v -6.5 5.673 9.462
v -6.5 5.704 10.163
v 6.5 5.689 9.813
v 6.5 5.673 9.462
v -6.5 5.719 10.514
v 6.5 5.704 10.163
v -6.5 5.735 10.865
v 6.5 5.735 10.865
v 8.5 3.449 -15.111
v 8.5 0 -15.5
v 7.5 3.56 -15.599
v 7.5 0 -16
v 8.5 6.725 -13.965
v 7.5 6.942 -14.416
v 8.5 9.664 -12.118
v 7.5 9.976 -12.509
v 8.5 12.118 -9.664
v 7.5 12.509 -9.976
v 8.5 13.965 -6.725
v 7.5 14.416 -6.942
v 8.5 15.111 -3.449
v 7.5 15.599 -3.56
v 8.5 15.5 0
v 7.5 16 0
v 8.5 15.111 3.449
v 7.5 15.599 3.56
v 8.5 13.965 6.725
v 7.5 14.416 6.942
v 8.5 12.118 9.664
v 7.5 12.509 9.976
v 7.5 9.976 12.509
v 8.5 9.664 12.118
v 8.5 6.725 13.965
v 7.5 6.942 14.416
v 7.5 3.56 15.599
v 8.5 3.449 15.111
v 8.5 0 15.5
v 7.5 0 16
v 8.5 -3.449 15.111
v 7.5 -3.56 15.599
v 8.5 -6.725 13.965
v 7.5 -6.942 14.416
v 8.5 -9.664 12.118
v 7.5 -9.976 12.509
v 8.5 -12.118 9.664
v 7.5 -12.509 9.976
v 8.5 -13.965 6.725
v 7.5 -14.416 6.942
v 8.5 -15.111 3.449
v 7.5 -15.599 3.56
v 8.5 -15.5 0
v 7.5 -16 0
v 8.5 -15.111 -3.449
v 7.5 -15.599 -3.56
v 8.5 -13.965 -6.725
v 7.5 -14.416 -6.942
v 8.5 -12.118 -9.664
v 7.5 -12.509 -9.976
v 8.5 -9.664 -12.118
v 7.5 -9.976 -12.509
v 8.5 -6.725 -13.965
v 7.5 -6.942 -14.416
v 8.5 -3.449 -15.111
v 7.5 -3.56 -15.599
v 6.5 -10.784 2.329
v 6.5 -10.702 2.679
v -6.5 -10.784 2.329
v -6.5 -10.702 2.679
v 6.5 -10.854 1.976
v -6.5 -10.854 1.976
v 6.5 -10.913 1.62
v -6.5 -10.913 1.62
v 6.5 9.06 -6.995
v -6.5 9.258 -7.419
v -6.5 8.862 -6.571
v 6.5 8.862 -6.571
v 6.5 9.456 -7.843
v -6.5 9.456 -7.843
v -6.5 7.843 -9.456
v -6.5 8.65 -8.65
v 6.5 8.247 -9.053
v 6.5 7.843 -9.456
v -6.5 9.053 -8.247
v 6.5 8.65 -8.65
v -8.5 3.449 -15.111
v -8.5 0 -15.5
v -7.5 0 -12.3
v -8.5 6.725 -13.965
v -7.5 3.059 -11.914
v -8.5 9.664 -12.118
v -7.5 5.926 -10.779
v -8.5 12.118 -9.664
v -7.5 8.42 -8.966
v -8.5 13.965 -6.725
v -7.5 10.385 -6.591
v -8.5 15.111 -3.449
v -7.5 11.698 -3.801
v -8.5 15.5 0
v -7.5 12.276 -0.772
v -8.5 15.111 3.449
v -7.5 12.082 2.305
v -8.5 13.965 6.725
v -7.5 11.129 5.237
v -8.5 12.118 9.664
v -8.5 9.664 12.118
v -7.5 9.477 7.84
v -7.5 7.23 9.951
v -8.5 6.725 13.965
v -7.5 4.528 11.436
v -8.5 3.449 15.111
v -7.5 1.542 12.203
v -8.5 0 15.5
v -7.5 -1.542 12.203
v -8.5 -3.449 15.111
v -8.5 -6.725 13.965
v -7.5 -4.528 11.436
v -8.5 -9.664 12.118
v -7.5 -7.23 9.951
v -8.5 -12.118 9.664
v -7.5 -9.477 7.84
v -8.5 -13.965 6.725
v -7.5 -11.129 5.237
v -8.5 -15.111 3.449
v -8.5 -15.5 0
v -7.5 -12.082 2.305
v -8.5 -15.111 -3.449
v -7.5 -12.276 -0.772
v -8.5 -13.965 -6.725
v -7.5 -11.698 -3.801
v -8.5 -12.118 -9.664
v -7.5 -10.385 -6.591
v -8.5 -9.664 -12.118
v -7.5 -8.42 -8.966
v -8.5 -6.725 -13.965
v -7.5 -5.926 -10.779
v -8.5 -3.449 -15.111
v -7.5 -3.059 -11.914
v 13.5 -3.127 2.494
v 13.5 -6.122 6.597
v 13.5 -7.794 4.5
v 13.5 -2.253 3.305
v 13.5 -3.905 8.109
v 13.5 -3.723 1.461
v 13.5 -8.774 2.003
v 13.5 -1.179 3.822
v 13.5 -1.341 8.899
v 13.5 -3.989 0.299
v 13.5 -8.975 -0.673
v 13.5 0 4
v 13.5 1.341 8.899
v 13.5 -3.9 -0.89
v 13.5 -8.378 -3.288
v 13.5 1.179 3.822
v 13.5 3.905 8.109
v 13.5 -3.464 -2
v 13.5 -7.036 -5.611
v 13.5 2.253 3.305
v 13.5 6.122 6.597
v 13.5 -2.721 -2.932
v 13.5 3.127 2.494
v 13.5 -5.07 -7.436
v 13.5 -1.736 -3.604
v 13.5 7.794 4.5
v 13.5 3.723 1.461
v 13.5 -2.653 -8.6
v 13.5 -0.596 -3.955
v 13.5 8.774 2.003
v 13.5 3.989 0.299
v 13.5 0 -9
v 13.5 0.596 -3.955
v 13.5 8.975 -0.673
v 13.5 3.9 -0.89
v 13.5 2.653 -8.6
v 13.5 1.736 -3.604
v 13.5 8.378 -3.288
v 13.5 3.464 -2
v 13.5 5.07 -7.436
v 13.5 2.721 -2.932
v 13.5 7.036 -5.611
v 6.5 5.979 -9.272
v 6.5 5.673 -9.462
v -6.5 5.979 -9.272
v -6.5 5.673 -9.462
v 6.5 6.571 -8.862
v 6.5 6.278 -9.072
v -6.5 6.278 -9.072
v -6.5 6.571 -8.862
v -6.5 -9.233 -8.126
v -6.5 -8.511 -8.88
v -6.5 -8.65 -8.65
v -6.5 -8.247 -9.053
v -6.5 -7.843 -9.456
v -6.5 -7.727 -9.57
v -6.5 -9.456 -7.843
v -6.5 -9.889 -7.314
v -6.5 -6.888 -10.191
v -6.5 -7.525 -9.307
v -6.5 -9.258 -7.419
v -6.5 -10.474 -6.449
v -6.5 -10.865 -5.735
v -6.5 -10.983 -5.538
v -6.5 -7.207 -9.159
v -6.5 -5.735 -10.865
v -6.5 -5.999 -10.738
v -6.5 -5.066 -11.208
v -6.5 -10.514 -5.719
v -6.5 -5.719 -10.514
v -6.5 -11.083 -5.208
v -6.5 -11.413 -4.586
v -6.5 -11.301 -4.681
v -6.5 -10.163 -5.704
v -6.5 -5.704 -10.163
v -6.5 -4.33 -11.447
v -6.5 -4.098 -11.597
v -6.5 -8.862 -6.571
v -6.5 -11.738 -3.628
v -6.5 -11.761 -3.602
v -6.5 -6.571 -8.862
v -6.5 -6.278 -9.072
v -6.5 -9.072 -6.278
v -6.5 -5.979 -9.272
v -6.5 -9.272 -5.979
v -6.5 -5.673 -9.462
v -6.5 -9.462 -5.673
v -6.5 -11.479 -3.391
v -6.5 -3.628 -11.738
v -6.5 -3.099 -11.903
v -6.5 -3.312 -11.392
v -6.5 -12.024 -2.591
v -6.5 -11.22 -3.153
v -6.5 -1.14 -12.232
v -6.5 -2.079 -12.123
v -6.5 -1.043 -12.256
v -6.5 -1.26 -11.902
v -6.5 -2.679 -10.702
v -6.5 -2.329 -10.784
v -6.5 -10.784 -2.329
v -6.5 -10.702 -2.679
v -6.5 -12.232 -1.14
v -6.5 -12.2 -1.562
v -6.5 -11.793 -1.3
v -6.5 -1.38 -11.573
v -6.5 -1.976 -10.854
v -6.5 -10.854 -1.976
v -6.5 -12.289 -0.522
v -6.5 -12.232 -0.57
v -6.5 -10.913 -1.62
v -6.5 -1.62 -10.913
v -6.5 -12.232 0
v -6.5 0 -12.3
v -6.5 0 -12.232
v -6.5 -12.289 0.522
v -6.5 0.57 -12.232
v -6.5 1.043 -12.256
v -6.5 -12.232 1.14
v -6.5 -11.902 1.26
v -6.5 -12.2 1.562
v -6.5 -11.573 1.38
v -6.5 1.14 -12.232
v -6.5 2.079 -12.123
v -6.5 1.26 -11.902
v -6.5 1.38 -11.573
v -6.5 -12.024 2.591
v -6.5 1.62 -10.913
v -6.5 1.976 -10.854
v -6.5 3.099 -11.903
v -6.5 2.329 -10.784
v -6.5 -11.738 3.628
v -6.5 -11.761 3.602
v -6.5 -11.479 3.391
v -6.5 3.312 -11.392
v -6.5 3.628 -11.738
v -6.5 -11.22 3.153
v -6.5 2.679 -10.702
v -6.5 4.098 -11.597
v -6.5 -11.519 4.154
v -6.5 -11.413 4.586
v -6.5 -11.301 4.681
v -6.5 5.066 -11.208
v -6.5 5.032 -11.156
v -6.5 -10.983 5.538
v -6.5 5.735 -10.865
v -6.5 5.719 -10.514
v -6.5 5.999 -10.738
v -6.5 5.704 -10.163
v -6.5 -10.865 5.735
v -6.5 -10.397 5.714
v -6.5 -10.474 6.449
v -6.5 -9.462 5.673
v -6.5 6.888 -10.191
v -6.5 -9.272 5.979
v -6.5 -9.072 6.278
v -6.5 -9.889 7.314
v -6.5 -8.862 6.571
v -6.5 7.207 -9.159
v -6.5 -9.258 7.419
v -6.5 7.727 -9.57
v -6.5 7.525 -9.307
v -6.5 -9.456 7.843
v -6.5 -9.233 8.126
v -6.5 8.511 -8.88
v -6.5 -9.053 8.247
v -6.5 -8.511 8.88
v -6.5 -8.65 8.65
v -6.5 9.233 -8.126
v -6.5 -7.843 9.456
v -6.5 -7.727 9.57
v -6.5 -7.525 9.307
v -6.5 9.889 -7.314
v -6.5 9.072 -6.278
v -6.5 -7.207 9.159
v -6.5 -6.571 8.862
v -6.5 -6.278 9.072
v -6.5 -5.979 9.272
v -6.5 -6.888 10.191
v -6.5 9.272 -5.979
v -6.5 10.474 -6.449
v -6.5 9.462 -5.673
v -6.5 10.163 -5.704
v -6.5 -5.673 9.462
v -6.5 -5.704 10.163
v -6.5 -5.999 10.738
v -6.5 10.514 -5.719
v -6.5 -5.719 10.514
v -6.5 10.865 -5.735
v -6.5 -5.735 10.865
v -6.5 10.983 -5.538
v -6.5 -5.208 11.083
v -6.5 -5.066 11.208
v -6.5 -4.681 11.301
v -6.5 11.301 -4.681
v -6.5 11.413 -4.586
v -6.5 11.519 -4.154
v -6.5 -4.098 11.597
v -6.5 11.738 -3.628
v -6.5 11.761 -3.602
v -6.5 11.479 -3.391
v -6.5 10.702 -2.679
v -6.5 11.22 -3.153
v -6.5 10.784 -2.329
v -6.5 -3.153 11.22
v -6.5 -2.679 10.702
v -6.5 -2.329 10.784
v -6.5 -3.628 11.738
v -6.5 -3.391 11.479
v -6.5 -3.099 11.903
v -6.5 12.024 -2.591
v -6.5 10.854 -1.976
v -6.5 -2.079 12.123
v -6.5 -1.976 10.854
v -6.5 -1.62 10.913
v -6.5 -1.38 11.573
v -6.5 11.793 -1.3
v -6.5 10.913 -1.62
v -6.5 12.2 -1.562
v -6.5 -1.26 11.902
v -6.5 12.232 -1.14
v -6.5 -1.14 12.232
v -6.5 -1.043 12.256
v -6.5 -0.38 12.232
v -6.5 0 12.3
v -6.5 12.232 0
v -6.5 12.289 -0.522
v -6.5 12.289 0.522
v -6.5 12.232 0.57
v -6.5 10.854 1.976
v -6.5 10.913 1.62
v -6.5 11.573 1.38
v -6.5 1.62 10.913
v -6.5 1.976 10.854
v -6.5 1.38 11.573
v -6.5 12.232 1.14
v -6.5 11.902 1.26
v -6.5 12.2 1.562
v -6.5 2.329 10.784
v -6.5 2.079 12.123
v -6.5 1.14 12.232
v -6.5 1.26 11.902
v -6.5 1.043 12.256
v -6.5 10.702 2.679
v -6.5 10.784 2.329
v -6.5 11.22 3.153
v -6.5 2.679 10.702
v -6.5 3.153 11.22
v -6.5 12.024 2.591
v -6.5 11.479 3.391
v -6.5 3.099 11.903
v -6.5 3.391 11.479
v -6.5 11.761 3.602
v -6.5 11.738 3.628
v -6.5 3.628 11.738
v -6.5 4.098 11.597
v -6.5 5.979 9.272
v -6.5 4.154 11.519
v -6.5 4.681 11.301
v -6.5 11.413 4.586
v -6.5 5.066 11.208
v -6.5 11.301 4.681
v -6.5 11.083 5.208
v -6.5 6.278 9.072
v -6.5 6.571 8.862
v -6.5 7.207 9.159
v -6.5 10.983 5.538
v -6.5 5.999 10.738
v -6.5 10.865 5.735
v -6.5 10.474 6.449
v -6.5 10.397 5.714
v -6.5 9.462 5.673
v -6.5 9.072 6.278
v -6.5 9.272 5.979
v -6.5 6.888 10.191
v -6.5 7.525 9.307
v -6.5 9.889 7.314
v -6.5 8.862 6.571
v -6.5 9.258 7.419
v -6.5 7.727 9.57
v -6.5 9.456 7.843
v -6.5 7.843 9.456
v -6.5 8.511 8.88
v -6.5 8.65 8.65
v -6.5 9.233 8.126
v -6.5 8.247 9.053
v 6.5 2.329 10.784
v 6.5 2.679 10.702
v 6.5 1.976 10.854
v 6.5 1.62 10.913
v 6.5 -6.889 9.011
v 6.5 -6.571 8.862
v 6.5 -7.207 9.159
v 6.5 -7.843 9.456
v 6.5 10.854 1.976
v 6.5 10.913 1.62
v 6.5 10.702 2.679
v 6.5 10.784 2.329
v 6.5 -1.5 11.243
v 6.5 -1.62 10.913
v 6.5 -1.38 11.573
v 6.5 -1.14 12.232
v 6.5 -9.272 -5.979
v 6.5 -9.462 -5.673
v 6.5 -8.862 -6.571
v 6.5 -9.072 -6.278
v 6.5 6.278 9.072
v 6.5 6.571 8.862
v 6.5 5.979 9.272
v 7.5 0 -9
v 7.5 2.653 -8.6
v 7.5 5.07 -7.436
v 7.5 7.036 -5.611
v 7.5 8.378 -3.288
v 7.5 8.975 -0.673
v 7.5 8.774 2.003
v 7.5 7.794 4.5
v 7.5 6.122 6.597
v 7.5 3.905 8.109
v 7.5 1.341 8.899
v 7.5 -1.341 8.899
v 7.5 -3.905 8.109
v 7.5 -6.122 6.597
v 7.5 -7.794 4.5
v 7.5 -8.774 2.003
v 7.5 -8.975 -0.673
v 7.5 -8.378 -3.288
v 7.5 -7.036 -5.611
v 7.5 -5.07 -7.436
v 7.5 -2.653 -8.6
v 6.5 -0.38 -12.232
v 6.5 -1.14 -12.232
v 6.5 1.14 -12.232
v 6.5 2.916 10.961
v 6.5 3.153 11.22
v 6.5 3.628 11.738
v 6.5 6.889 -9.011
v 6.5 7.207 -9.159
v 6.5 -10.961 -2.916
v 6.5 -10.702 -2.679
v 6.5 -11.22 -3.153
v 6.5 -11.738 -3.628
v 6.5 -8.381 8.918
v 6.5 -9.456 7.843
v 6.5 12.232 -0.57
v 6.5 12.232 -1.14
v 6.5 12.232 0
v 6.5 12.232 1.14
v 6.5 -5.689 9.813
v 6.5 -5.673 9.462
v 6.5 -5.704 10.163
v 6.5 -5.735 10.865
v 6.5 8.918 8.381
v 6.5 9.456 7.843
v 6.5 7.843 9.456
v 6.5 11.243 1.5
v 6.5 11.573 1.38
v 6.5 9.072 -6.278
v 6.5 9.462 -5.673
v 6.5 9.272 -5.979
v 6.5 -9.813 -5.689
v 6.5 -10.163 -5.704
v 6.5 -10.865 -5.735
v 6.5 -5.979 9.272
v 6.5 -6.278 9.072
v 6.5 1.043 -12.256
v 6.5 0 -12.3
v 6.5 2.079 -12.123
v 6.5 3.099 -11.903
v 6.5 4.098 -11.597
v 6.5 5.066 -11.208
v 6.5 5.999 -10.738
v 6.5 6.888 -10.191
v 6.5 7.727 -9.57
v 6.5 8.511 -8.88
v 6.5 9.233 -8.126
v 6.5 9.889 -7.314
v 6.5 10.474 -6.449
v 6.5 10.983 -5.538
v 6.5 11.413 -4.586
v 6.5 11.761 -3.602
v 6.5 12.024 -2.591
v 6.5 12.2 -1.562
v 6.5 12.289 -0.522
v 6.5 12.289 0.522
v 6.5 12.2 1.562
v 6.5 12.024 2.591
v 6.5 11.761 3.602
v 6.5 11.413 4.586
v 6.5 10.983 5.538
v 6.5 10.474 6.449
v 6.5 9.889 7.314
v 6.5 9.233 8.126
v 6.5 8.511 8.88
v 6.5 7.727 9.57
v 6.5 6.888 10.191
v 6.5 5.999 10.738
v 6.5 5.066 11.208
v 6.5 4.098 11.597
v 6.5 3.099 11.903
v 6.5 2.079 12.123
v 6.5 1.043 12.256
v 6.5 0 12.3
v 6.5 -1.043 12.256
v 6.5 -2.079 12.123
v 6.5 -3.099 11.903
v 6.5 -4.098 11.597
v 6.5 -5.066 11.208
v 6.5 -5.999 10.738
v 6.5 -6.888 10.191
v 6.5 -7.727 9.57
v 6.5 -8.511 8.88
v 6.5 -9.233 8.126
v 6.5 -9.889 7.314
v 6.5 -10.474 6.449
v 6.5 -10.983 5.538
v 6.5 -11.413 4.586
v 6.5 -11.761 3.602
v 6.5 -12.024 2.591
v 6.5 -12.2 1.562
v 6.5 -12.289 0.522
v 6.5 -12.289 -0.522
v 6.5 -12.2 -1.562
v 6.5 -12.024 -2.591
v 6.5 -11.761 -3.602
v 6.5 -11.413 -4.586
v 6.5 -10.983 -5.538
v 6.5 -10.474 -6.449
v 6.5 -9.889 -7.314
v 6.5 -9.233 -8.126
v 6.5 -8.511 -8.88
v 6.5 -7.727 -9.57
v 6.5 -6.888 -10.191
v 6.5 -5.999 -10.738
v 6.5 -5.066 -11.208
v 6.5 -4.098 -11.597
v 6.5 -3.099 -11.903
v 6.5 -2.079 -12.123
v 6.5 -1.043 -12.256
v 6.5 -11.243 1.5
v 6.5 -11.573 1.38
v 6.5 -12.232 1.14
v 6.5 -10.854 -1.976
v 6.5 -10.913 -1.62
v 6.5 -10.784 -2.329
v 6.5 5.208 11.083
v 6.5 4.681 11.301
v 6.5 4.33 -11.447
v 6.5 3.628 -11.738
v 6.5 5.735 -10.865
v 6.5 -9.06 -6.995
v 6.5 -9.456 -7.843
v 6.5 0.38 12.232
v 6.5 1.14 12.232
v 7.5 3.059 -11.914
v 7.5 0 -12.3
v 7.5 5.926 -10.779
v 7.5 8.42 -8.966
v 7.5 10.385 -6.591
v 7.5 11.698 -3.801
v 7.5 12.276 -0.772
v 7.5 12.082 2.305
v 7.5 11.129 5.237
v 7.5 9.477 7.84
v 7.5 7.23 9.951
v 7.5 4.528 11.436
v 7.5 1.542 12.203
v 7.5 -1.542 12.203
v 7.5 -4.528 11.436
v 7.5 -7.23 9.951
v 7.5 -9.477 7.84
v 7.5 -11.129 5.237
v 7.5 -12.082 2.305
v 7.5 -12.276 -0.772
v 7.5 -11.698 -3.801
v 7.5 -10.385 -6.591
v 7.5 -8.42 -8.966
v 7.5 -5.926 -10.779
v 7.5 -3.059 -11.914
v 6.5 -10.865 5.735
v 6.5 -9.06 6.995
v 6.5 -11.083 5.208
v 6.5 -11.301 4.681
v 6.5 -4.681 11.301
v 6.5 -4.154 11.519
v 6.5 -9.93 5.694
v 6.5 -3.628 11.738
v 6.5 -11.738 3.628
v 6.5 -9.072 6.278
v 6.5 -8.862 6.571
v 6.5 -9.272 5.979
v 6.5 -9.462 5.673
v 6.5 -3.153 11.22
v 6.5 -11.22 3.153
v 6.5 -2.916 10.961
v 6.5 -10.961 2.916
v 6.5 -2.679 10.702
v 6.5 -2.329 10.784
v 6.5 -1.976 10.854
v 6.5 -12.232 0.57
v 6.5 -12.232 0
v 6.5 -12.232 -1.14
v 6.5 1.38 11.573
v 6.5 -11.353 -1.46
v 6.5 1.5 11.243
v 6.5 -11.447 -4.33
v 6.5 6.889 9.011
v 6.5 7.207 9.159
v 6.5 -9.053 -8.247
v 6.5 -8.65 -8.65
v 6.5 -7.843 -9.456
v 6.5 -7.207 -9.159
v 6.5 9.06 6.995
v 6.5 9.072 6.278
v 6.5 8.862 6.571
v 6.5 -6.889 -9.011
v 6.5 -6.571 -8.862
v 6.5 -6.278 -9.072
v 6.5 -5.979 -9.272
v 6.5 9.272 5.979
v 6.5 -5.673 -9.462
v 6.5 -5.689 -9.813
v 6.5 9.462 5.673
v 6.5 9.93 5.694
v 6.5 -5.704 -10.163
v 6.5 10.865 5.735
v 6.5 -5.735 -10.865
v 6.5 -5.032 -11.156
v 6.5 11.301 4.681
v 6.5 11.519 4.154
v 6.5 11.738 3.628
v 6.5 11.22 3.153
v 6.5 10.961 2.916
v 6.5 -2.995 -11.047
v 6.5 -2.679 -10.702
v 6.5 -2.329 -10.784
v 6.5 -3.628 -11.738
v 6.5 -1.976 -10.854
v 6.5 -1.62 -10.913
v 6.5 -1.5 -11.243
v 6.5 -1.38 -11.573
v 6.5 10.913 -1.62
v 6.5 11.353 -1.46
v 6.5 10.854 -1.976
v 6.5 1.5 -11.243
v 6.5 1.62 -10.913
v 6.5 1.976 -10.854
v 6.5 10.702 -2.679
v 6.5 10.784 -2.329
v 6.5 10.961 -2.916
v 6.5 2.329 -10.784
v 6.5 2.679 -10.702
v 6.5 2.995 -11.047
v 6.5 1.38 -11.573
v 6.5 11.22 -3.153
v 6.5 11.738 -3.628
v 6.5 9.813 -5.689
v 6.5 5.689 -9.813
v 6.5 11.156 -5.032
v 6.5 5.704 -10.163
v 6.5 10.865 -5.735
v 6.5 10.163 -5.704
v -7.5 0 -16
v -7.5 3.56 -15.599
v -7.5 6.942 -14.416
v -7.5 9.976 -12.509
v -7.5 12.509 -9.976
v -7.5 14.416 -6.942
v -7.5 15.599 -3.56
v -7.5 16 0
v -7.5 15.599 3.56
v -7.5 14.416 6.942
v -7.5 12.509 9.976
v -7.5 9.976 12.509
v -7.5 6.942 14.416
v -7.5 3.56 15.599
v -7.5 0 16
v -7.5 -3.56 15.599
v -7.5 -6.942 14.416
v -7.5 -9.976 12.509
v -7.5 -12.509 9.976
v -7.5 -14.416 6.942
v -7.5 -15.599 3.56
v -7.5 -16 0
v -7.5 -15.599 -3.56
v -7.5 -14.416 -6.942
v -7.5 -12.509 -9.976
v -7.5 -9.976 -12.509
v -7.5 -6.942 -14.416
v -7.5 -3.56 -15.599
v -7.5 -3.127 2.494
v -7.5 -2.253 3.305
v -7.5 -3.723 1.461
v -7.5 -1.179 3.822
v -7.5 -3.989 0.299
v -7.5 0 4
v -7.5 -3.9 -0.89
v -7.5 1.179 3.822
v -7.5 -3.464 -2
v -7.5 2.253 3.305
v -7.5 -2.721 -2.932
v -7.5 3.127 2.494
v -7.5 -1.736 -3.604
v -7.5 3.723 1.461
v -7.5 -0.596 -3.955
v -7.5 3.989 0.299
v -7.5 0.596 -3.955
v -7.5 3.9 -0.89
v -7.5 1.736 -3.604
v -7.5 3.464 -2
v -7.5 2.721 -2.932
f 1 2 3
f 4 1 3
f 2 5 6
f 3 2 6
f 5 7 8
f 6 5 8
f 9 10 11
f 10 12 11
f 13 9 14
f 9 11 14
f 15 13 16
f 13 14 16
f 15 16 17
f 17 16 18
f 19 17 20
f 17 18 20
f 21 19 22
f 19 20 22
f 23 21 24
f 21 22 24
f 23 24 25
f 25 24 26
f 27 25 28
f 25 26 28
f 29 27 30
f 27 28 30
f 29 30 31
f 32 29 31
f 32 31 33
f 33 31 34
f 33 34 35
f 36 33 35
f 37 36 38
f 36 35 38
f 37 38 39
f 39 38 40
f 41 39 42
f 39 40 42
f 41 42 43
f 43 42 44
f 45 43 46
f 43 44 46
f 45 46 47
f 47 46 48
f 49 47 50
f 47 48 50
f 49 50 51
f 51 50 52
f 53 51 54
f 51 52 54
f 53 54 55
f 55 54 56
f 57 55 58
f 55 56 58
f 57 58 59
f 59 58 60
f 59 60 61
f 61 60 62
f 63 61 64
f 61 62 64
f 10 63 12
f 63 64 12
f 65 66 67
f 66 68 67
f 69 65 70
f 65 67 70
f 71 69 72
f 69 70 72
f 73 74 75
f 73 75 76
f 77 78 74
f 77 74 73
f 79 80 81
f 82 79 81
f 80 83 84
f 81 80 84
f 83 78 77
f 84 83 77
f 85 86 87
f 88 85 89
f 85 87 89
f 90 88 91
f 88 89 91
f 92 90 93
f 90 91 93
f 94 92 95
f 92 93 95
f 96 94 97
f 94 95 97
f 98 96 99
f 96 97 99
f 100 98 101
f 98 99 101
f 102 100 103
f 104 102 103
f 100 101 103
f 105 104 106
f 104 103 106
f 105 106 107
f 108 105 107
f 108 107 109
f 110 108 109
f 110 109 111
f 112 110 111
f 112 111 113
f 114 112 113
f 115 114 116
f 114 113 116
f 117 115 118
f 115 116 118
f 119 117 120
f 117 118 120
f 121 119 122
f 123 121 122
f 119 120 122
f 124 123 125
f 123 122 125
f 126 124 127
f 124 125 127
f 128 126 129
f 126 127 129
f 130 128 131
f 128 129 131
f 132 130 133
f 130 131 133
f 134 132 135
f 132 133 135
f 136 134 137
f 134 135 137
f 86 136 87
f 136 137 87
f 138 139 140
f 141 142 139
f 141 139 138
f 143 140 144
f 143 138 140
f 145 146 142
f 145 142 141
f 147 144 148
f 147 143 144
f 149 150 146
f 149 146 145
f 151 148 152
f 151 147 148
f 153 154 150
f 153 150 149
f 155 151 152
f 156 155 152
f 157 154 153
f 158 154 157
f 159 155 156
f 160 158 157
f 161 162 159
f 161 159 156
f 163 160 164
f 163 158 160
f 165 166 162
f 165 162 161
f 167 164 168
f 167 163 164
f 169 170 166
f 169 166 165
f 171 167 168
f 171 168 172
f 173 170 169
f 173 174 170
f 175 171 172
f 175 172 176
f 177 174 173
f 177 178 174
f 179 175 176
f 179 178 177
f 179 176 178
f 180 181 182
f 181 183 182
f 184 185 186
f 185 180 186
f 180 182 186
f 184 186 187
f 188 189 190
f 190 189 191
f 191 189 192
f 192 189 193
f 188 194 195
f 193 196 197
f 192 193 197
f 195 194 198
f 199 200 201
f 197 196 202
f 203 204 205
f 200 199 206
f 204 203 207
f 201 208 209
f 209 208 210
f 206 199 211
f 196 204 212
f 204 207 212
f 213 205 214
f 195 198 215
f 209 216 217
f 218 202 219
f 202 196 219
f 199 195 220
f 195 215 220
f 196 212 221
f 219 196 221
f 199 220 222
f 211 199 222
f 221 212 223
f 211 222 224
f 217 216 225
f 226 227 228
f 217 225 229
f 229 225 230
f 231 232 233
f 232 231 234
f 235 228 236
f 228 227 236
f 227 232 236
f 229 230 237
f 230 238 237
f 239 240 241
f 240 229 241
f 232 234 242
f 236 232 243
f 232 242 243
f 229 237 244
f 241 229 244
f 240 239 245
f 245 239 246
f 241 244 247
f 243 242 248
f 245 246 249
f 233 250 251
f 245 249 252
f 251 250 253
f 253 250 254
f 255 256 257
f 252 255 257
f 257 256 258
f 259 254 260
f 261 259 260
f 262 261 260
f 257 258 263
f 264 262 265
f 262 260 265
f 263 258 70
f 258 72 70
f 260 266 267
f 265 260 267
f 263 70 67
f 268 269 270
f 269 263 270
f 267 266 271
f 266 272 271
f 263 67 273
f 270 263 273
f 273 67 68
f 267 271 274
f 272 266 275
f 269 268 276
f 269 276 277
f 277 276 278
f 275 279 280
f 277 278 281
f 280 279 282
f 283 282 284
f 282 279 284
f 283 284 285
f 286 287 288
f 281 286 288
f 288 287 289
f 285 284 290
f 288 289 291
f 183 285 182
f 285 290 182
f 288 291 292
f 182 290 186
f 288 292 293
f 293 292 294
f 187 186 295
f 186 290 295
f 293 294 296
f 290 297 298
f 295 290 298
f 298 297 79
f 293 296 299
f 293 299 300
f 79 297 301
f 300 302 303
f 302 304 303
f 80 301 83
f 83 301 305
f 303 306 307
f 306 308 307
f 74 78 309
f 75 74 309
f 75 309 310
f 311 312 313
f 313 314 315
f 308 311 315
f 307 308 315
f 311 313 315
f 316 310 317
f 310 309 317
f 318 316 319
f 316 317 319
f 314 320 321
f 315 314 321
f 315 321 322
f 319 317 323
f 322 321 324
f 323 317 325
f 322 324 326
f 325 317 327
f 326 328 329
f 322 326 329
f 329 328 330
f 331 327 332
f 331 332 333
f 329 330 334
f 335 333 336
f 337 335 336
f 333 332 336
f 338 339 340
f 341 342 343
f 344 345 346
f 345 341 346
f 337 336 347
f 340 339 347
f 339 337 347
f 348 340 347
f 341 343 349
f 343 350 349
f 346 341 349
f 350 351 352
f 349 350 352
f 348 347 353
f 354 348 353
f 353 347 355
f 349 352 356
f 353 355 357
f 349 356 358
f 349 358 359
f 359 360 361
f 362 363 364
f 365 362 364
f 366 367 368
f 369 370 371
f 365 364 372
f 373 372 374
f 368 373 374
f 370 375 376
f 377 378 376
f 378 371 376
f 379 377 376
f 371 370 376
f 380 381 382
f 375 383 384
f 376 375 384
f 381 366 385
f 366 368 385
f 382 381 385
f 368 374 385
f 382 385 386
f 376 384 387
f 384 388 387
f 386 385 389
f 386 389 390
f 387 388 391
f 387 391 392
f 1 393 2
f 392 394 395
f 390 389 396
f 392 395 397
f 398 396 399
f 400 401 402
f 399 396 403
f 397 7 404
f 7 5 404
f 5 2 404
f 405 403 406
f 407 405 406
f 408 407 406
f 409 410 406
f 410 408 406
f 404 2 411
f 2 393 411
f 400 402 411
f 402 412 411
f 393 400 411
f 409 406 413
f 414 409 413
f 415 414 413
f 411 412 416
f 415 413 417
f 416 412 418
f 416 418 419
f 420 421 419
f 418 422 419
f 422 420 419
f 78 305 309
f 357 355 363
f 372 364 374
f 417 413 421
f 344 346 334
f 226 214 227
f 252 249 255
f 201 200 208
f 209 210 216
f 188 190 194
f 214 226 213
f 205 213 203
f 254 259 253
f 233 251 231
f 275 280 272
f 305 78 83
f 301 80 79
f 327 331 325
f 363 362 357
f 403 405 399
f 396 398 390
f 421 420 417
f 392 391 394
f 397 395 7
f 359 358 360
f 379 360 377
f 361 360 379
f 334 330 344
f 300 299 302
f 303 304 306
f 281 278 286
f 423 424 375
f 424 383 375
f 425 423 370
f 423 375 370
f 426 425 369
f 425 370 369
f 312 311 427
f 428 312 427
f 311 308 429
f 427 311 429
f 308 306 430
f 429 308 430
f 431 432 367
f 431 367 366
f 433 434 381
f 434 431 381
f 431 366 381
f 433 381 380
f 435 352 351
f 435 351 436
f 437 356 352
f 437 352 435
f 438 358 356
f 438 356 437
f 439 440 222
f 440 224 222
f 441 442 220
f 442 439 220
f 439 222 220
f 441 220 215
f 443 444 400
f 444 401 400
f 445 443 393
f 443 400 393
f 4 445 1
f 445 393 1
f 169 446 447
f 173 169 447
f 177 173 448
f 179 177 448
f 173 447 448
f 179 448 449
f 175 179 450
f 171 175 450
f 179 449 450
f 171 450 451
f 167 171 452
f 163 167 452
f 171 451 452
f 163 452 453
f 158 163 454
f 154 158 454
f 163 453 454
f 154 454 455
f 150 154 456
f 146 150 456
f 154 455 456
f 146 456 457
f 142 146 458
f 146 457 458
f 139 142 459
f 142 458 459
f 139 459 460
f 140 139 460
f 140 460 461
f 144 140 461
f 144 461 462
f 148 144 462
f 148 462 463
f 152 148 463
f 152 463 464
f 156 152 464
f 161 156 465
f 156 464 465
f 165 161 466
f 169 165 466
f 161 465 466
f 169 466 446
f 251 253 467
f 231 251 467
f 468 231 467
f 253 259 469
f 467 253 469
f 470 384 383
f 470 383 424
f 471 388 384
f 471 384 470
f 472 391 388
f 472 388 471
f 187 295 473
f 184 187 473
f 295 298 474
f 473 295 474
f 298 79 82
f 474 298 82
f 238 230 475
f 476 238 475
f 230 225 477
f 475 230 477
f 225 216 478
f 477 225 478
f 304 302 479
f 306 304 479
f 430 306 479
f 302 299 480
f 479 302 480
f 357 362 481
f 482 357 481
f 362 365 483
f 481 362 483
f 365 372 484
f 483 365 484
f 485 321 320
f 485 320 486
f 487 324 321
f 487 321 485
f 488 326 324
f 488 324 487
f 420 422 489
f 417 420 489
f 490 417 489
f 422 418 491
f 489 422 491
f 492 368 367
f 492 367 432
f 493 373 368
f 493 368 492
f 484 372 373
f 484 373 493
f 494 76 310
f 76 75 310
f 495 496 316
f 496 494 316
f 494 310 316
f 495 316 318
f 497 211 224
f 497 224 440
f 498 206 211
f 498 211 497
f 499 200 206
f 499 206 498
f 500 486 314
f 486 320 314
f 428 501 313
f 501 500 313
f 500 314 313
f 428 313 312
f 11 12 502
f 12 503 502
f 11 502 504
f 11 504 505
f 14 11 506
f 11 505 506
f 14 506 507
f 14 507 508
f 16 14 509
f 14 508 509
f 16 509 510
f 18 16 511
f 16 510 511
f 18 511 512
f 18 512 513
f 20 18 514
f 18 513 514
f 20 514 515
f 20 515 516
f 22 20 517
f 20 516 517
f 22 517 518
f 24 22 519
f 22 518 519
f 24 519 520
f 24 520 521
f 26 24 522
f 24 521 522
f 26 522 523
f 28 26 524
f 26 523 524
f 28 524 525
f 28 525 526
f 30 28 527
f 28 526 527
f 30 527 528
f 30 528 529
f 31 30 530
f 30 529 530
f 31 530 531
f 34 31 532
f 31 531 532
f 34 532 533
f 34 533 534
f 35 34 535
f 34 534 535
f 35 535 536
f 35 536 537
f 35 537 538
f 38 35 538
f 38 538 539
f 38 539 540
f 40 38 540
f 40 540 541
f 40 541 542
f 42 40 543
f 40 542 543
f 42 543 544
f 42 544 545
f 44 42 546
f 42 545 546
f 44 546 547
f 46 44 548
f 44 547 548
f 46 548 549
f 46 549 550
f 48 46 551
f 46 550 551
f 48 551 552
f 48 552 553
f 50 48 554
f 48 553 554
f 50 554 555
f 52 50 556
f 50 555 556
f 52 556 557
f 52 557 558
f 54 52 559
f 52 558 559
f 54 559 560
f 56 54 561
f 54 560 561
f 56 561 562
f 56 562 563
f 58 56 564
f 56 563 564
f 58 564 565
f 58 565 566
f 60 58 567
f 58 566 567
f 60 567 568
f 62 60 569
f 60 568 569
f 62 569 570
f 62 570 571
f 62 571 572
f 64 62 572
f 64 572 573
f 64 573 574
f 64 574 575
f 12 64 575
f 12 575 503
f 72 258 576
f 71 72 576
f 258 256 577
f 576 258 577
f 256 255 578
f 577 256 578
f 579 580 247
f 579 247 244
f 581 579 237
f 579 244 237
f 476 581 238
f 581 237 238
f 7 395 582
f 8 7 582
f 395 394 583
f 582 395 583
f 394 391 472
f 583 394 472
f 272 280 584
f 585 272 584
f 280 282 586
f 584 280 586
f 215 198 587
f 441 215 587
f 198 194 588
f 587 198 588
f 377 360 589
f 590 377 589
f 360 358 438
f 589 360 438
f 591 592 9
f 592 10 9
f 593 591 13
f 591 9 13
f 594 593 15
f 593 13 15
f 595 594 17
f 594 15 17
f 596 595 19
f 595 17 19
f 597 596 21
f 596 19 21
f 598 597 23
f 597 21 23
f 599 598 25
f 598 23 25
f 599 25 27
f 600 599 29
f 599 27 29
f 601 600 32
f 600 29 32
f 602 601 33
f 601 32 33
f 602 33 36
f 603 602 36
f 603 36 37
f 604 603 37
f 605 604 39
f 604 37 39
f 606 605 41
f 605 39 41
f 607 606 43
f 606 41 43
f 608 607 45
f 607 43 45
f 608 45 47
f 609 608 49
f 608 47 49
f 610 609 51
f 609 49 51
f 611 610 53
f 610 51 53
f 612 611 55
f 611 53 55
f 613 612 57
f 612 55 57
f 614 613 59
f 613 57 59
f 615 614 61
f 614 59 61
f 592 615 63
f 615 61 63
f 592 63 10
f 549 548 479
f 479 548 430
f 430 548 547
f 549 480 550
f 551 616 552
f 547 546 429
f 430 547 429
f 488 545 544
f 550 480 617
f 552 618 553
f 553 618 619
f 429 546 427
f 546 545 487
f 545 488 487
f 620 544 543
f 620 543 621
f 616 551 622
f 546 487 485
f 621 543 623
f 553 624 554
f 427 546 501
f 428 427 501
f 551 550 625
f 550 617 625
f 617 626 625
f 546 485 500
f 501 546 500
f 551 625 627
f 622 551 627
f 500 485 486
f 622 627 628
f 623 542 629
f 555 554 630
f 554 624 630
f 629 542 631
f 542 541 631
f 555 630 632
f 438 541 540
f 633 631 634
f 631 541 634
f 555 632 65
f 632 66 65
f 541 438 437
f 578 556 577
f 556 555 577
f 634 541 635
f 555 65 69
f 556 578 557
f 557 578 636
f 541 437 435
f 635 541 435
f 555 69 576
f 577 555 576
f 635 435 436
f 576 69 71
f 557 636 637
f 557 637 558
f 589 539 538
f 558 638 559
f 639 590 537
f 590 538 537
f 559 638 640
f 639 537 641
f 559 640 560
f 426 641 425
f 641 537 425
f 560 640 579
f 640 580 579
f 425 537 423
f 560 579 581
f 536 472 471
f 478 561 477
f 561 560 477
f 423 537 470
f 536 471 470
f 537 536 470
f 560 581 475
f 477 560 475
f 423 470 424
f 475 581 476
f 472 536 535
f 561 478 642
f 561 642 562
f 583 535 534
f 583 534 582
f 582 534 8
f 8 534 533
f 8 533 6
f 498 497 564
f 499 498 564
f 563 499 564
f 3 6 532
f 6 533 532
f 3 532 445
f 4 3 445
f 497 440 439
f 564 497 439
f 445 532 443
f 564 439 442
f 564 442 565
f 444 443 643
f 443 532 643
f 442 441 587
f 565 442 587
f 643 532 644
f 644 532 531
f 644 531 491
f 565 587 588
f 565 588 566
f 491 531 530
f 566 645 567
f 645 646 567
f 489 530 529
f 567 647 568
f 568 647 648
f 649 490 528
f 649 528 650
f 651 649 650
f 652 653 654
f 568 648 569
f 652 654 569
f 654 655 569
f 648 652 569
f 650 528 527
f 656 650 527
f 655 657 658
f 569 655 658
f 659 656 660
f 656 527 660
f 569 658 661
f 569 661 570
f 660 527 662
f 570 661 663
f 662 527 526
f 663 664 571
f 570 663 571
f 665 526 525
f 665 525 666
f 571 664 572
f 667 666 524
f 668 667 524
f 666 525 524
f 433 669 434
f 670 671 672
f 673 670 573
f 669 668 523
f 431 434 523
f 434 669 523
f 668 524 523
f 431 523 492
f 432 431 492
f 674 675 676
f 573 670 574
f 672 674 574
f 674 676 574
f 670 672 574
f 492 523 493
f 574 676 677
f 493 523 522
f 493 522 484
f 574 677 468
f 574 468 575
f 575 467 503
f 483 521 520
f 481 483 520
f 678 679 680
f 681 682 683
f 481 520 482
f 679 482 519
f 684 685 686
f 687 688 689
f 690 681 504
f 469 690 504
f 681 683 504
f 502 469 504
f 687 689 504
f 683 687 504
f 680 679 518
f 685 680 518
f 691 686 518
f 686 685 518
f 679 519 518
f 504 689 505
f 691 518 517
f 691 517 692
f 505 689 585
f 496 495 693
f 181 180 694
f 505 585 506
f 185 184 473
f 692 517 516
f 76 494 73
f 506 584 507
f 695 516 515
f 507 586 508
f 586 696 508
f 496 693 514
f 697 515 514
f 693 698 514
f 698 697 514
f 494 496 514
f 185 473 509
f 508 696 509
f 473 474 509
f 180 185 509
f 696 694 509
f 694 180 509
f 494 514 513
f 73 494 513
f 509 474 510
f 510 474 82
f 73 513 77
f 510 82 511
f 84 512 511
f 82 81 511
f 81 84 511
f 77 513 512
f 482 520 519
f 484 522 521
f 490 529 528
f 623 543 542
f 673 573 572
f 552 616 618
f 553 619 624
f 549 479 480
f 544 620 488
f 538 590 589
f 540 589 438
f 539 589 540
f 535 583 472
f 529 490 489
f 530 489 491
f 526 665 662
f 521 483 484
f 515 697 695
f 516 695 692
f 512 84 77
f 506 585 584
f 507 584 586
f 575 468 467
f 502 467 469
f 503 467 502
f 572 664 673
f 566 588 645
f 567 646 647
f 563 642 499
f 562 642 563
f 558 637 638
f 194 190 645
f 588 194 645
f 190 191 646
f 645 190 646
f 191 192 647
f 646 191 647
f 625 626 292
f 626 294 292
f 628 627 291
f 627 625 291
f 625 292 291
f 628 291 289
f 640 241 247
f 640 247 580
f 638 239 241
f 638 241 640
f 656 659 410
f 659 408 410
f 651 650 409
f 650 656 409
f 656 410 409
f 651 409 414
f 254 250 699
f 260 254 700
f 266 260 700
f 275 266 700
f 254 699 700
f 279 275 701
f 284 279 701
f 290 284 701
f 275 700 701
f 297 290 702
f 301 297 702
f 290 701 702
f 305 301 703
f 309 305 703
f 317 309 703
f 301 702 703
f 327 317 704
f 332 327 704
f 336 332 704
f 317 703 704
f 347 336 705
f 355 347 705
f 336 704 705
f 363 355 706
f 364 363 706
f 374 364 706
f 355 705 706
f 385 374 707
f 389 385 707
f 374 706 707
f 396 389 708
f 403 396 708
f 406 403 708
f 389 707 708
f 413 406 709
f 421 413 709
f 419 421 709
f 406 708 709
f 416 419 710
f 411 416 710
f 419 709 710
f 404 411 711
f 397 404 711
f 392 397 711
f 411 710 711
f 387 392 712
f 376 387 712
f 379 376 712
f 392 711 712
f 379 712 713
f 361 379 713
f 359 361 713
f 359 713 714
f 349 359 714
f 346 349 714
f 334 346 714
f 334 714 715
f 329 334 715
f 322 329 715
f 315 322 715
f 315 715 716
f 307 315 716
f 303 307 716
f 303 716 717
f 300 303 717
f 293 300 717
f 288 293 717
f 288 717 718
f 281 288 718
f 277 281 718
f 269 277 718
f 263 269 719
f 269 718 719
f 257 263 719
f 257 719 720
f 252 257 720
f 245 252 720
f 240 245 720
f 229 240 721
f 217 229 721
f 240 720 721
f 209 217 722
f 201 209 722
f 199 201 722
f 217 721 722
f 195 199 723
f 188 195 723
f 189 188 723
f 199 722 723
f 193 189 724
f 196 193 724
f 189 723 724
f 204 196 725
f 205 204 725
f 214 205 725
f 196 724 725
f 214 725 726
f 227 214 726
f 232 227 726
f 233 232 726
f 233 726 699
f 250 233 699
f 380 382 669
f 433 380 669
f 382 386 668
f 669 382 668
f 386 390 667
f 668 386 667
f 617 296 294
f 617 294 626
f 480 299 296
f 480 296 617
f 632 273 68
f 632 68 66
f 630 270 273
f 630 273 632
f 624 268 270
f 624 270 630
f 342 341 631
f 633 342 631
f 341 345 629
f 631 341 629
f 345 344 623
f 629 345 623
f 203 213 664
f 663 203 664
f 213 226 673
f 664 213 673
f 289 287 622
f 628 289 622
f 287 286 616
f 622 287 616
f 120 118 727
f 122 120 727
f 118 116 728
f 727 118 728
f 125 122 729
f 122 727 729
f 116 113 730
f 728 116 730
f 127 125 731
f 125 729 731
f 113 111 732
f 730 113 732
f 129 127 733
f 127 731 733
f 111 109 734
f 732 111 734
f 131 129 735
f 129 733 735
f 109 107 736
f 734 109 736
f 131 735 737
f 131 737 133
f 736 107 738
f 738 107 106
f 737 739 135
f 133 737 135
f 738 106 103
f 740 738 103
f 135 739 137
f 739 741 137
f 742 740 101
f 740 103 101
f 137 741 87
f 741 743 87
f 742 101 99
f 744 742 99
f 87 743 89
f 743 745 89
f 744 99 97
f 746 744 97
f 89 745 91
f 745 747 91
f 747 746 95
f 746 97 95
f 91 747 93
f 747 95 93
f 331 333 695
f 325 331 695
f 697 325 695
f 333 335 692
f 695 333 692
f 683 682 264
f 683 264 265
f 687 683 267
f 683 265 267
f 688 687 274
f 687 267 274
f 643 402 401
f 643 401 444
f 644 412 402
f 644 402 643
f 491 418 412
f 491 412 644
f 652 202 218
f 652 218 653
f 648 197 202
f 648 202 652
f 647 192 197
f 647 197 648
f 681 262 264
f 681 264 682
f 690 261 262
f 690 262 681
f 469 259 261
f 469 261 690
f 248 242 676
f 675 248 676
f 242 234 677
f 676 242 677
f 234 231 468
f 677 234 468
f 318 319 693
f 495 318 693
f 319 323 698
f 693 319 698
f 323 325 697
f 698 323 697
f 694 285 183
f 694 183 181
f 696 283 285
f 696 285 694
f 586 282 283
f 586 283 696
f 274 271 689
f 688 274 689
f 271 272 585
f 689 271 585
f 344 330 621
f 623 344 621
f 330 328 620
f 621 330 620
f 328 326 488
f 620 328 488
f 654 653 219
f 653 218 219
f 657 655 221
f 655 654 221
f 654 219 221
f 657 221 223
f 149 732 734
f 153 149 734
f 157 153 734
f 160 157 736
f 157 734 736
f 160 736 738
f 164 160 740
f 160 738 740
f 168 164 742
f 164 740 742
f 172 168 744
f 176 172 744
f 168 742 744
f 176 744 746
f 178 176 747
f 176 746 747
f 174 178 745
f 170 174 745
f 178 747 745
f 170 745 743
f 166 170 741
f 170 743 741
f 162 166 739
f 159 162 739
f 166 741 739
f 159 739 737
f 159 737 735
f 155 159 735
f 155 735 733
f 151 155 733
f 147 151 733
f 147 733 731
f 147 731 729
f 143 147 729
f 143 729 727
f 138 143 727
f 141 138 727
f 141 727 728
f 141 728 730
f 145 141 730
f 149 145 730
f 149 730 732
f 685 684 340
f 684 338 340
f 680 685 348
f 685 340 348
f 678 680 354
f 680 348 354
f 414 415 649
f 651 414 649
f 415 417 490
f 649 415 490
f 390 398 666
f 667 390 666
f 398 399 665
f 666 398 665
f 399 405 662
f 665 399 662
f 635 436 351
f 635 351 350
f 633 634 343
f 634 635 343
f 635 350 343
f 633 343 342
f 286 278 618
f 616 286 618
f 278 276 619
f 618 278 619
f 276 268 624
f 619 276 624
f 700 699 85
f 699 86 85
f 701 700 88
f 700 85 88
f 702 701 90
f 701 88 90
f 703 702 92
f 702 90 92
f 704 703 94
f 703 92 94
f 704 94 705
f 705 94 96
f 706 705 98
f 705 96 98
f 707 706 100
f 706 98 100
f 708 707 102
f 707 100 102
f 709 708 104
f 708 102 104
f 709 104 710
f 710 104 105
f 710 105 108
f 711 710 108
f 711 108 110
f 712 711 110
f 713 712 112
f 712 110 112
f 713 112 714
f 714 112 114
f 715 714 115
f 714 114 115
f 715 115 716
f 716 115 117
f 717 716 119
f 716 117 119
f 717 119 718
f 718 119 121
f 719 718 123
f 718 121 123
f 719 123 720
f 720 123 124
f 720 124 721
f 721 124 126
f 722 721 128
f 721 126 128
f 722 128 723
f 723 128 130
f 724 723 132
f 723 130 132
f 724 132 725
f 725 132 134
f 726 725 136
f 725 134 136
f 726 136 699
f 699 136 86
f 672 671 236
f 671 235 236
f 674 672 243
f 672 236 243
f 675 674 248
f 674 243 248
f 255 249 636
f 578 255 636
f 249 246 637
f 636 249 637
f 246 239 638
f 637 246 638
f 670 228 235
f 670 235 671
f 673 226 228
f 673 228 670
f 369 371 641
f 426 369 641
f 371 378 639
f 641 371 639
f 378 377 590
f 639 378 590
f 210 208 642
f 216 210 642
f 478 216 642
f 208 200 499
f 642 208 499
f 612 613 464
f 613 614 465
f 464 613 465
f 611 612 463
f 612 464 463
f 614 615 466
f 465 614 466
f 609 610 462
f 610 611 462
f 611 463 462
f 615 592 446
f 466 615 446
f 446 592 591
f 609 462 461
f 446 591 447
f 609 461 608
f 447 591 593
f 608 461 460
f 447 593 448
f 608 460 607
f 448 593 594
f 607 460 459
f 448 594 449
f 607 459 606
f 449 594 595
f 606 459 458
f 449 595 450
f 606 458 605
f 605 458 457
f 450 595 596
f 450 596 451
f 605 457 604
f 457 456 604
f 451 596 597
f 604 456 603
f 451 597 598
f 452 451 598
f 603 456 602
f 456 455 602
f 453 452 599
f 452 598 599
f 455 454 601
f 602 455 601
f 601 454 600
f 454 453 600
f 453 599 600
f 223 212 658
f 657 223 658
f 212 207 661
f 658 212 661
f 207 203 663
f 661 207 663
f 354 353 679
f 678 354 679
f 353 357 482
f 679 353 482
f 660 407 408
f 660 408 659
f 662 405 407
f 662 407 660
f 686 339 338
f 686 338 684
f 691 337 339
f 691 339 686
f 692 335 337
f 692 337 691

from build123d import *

# Parameters (mm, degrees)
SKETCH2_R                = 9
BOSS_EXTRUDE1_DEPTH      = 6
F_6_0_6_DIAMETER_HOLE1_D = 8
RIB1_REACH               = 28.349
SKETCH5_WALL_W           = 67.697248506
SKETCH5_WALL_H           = 2.28033022
RIB1_DRAFT_ANGLE         = 20
RIB2_REACH               = 28.349
SKETCH6_WALL_W           = 67.697248506
SKETCH6_WALL_H           = 2.28033022
RIB2_DRAFT_ANGLE         = 20
RIB3_REACH               = 28.349
SKETCH7_WALL_W           = 67.697248506
SKETCH7_WALL_H           = 2.28033022
RIB3_DRAFT_ANGLE         = 20
RIB4_REACH               = 28.349
SKETCH8_WALL_W           = 67.697248506
SKETCH8_WALL_H           = 2.28033022
RIB4_DRAFT_ANGLE         = 20
RIB5_REACH               = 28.349
SKETCH9_WALL_W           = 67.697248506
SKETCH9_WALL_H           = 2.28033022
RIB5_DRAFT_ANGLE         = 20
RIB6_REACH               = 28.349
SKETCH10_WALL_W          = 67.697248506
SKETCH10_WALL_H          = 2.28033022
RIB6_DRAFT_ANGLE         = 20
RIB7_REACH               = 28.349
SKETCH11_WALL_W          = 67.697248506
SKETCH11_WALL_H          = 2.28033022
RIB7_DRAFT_ANGLE         = 20
RIB8_REACH               = 28.349
SKETCH12_WALL_W          = 67.697248506
SKETCH12_WALL_H          = 2.28033022
RIB8_DRAFT_ANGLE         = 20
RIB9_REACH               = 28.349
SKETCH13_WALL_W          = 67.697248506
SKETCH13_WALL_H          = 2.28033022
RIB9_DRAFT_ANGLE         = 20
RIB10_REACH              = 28.349
SKETCH14_WALL_W          = 67.697248506
SKETCH14_WALL_H          = 2.28033022
RIB10_DRAFT_ANGLE        = 20
RIB11_REACH              = 28.349
SKETCH15_WALL_W          = 67.697248506
SKETCH15_WALL_H          = 2.28033022
RIB11_DRAFT_ANGLE        = 20
RIB12_REACH              = 28.349
SKETCH16_WALL_W          = 67.697248506
SKETCH16_WALL_H          = 2.28033022
RIB12_DRAFT_ANGLE        = 20
RIB13_REACH              = 28.349
SKETCH17_WALL_W          = 67.697248506
SKETCH17_WALL_H          = 2.28033022
RIB13_DRAFT_ANGLE        = 20
RIB14_REACH              = 28.349
SKETCH18_WALL_W          = 67.697248506
SKETCH18_WALL_H          = 2.28033022
RIB14_DRAFT_ANGLE        = 20
RIB15_REACH              = 28.349
SKETCH19_WALL_W          = 67.697248506
SKETCH19_WALL_H          = 2.28033022
RIB15_DRAFT_ANGLE        = 20
RIB16_REACH              = 28.349
SKETCH20_WALL_W          = 67.697248506
SKETCH20_WALL_H          = 2.28033022
RIB16_DRAFT_ANGLE        = 20


with BuildPart() as part:
    # Sketch1 → Revolve1 (revolve)
    with BuildSketch(Plane.XY, mode=Mode.PRIVATE) as revolve1_sk:
        Polygon((-7.5, 12.3), (-7.5, 0), (7.5, 0), (7.5, 12.3), (8.5, 15.5), (7.5, 16), (6.5, 12.3), (6.5, 11.032395447), (-6.5, 11.032395447), (-6.5, 12.3), (-7.5, 16), (-8.5, 15.5), align=None)
    revolve(revolve1_sk.sketch.rotate(Axis((-8.5, 0, 0), (1, 0, 0)), 270), axis=Axis((-8.5, 0, 0), (1, 0, 0)))

    # Sketch2 → Boss-Extrude1 (add)
    with BuildSketch(Plane(origin=(7.5, 0, 0), x_dir=(0, 0, -1), z_dir=(1, 0, 0))):
        Circle(SKETCH2_R)
    extrude(amount=BOSS_EXTRUDE1_DEPTH)

    # Ø6.0 (6) Diameter Hole1 (through all)
    with Locations(Plane(origin=(13.5, 0, 0), x_dir=(0, 0, -1), z_dir=(1, 0, 0))):
        with Locations((0, 0)):
            Hole(F_6_0_6_DIAMETER_HOLE1_D / 2)

    # Sketch5 wall → Rib1 (add, up to next)
    with BuildSketch(Plane(origin=(0, -12.232395447, 0), x_dir=(1, 0, 0), z_dir=(0, 1, 0)), mode=Mode.PRIVATE) as rib1_sk1:
        Rectangle(SKETCH5_WALL_W, SKETCH5_WALL_H)
    rib1_tool1 = extrude(rib1_sk1.sketch, amount=RIB1_REACH, mode=Mode.PRIVATE) - part.part
    add(rib1_tool1.solids().sort_by_distance((0, -12.232395447, 0))[0])

    # Rib1 draft
    rib1_draft_faces = [part.faces().sort_by_distance(p)[0] for p in [
        (0, -11.732395447, -1.14016511),
        (0, -11.732395447, 1.14016511),
    ]]
    draft(rib1_draft_faces, Plane.XZ.offset(12.232395447), RIB1_DRAFT_ANGLE)

    # Sketch6 wall → Rib2 (add, up to next)
    with BuildSketch(Plane.XY.offset(-12.232395447), mode=Mode.PRIVATE) as rib2_sk1:
        Rectangle(SKETCH6_WALL_W, SKETCH6_WALL_H)
    rib2_tool1 = extrude(rib2_sk1.sketch, amount=RIB2_REACH, mode=Mode.PRIVATE) - part.part
    add(rib2_tool1.solids().sort_by_distance((0, 0, -12.232395447))[0])

    # Rib2 draft
    rib2_draft_faces = [part.faces().sort_by_distance(p)[0] for p in [
        (0, 1.14016511, -11.732395447),
        (0, -1.14016511, -11.732395447),
    ]]
    draft(rib2_draft_faces, Plane(origin=(0, 0, -12.232395447), x_dir=(1, 0, 0), z_dir=(0, 0, -1)), RIB2_DRAFT_ANGLE)

    # Sketch7 wall → Rib3 (add, up to next)
    with BuildSketch(Plane.XZ.offset(-12.232395447), mode=Mode.PRIVATE) as rib3_sk1:
        Rectangle(SKETCH7_WALL_W, SKETCH7_WALL_H)
    rib3_tool1 = extrude(rib3_sk1.sketch, amount=RIB3_REACH, mode=Mode.PRIVATE) - part.part
    add(rib3_tool1.solids().sort_by_distance((0, 12.232395447, 0))[0])

    # Rib3 draft
    rib3_draft_faces = [part.faces().sort_by_distance(p)[0] for p in [
        (0, 11.732395447, 1.14016511),
        (0, 11.732395447, -1.14016511),
    ]]
    draft(rib3_draft_faces, Plane(origin=(0, 12.232395447, 0), x_dir=(1, 0, 0), z_dir=(0, 1, 0)), RIB3_DRAFT_ANGLE)

    # Sketch8 wall → Rib4 (add, up to next)
    with BuildSketch(Plane(origin=(0, 0, 12.232395447), x_dir=(1, 0, 0), z_dir=(0, 0, -1)), mode=Mode.PRIVATE) as rib4_sk1:
        Rectangle(SKETCH8_WALL_W, SKETCH8_WALL_H)
    rib4_tool1 = extrude(rib4_sk1.sketch, amount=RIB4_REACH, mode=Mode.PRIVATE) - part.part
    add(rib4_tool1.solids().sort_by_distance((0, 0, 12.232395447))[0])

    # Rib4 draft
    rib4_draft_faces = [part.faces().sort_by_distance(p)[0] for p in [
        (0, -1.14016511, 11.732395447),
        (0, 1.14016511, 11.732395447),
    ]]
    draft(rib4_draft_faces, Plane.XY.offset(12.232395447), RIB4_DRAFT_ANGLE)

    # Sketch9 wall → Rib5 (add, up to next)
    with BuildSketch(Plane(origin=(0, 8.649609771, 8.649609771), x_dir=(1, 0, 0), z_dir=(0, -0.707106781187, -0.707106781187)), mode=Mode.PRIVATE) as rib5_sk1:
        Rectangle(SKETCH9_WALL_W, SKETCH9_WALL_H)
    rib5_tool1 = extrude(rib5_sk1.sketch, amount=RIB5_REACH, mode=Mode.PRIVATE) - part.part
    add(rib5_tool1.solids().sort_by_distance((0, 8.649609771, 8.649609771))[0])

    # Rib5 draft
    rib5_draft_faces = [part.faces().sort_by_distance(p)[0] for p in [
        (0, 7.4898379, 9.102274861),
        (0, 9.102274861, 7.4898379),
    ]]
    draft(rib5_draft_faces, Plane(origin=(0, 8.649609771, 8.649609771), x_dir=(1, 0, 0), z_dir=(0, 0.707106781187, 0.707106781187)), RIB5_DRAFT_ANGLE)

    # Sketch10 wall → Rib6 (add, up to next)
    with BuildSketch(Plane(origin=(0, 11.301259787, 4.681135076), x_dir=(1, 0, 0), z_dir=(0, -0.923879532511, -0.382683432365)), mode=Mode.PRIVATE) as rib6_sk1:
        Rectangle(SKETCH10_WALL_W, SKETCH10_WALL_H)
    rib6_tool1 = extrude(rib6_sk1.sketch, amount=RIB6_REACH, mode=Mode.PRIVATE) - part.part
    add(rib6_tool1.solids().sort_by_distance((0, 11.301259787, 4.681135076))[0])

    # Rib6 draft
    rib6_draft_faces = [part.faces().sort_by_distance(p)[0] for p in [
        (0, 10.402997723, 5.543168569),
        (0, 11.275642318, 3.436418151),
    ]]
    draft(rib6_draft_faces, Plane(origin=(0, 11.301259787, 4.681135076), x_dir=(1, 0, 0), z_dir=(0, 0.923879532511, 0.382683432365)), RIB6_DRAFT_ANGLE)

    # Sketch11 wall → Rib7 (add, up to next)
    with BuildSketch(Plane(origin=(0, 4.681135076, -11.301259787), x_dir=(1, 0, 0), z_dir=(0, -0.382683432365, 0.923879532511)), mode=Mode.PRIVATE) as rib7_sk1:
        Rectangle(SKETCH11_WALL_W, SKETCH11_WALL_H)
    rib7_tool1 = extrude(rib7_sk1.sketch, amount=RIB7_REACH, mode=Mode.PRIVATE) - part.part
    add(rib7_tool1.solids().sort_by_distance((0, 4.681135076, -11.301259787))[0])

    # Rib7 draft
    rib7_draft_faces = [part.faces().sort_by_distance(p)[0] for p in [
        (0, 5.543168569, -10.402997723),
        (0, 3.436418151, -11.275642318),
    ]]
    draft(rib7_draft_faces, Plane(origin=(0, 4.681135076, -11.301259787), x_dir=(1, 0, 0), z_dir=(0, 0.382683432365, -0.923879532511)), RIB7_DRAFT_ANGLE)

    # Sketch12 wall → Rib8 (add, up to next)
    with BuildSketch(Plane(origin=(0, 4.681135076, 11.301259787), x_dir=(1, 0, 0), z_dir=(0, -0.382683432365, -0.923879532511)), mode=Mode.PRIVATE) as rib8_sk1:
        Rectangle(SKETCH12_WALL_W, SKETCH12_WALL_H)
    rib8_tool1 = extrude(rib8_sk1.sketch, amount=RIB8_REACH, mode=Mode.PRIVATE) - part.part
    add(rib8_tool1.solids().sort_by_distance((0, 4.681135076, 11.301259787))[0])

    # Rib8 draft
    rib8_draft_faces = [part.faces().sort_by_distance(p)[0] for p in [
        (0, 3.436418151, 11.275642318),
        (0, 5.543168569, 10.402997723),
    ]]
    draft(rib8_draft_faces, Plane(origin=(0, 4.681135076, 11.301259787), x_dir=(1, 0, 0), z_dir=(0, 0.382683432365, 0.923879532511)), RIB8_DRAFT_ANGLE)

    # Sketch13 wall → Rib9 (add, up to next)
    with BuildSketch(Plane(origin=(0, -8.649609771, 8.649609771), x_dir=(1, 0, 0), z_dir=(0, 0.707106781187, -0.707106781187)), mode=Mode.PRIVATE) as rib9_sk1:
        Rectangle(SKETCH13_WALL_W, SKETCH13_WALL_H)
    rib9_tool1 = extrude(rib9_sk1.sketch, amount=RIB9_REACH, mode=Mode.PRIVATE) - part.part
    add(rib9_tool1.solids().sort_by_distance((0, -8.649609771, 8.649609771))[0])

    # Rib9 draft
    rib9_draft_faces = [part.faces().sort_by_distance(p)[0] for p in [
        (0, -9.102274861, 7.4898379),
        (0, -7.4898379, 9.102274861),
    ]]
    draft(rib9_draft_faces, Plane(origin=(0, -8.649609771, 8.649609771), x_dir=(1, 0, 0), z_dir=(0, -0.707106781187, 0.707106781187)), RIB9_DRAFT_ANGLE)

    # Sketch14 wall → Rib10 (add, up to next)
    with BuildSketch(Plane(origin=(0, 8.649609771, -8.649609771), x_dir=(1, 0, 0), z_dir=(0, -0.707106781187, 0.707106781187)), mode=Mode.PRIVATE) as rib10_sk1:
        Rectangle(SKETCH14_WALL_W, SKETCH14_WALL_H)
    rib10_tool1 = extrude(rib10_sk1.sketch, amount=RIB10_REACH, mode=Mode.PRIVATE) - part.part
    add(rib10_tool1.solids().sort_by_distance((0, 8.649609771, -8.649609771))[0])

    # Rib10 draft
    rib10_draft_faces = [part.faces().sort_by_distance(p)[0] for p in [
        (0, 9.102274861, -7.4898379),
        (0, 7.4898379, -9.102274861),
    ]]
    draft(rib10_draft_faces, Plane(origin=(0, 8.649609771, -8.649609771), x_dir=(1, 0, 0), z_dir=(0, 0.707106781187, -0.707106781187)), RIB10_DRAFT_ANGLE)

    # Sketch15 wall → Rib11 (add, up to next)
    with BuildSketch(Plane(origin=(0, -8.649609771, -8.649609771), x_dir=(1, 0, 0), z_dir=(0, 0.707106781187, 0.707106781187)), mode=Mode.PRIVATE) as rib11_sk1:
        Rectangle(SKETCH15_WALL_W, SKETCH15_WALL_H)
    rib11_tool1 = extrude(rib11_sk1.sketch, amount=RIB11_REACH, mode=Mode.PRIVATE) - part.part
    add(rib11_tool1.solids().sort_by_distance((0, -8.649609771, -8.649609771))[0])

    # Rib11 draft
    rib11_draft_faces = [part.faces().sort_by_distance(p)[0] for p in [
        (0, -7.4898379, -9.102274861),
        (0, -9.102274861, -7.4898379),
    ]]
    draft(rib11_draft_faces, Plane(origin=(0, -8.649609771, -8.649609771), x_dir=(1, 0, 0), z_dir=(0, -0.707106781187, -0.707106781187)), RIB11_DRAFT_ANGLE)

    # Sketch16 wall → Rib12 (add, up to next)
    with BuildSketch(Plane(origin=(0, 11.301259787, -4.681135076), x_dir=(1, 0, 0), z_dir=(0, -0.923879532511, 0.382683432365)), mode=Mode.PRIVATE) as rib12_sk1:
        Rectangle(SKETCH16_WALL_W, SKETCH16_WALL_H)
    rib12_tool1 = extrude(rib12_sk1.sketch, amount=RIB12_REACH, mode=Mode.PRIVATE) - part.part
    add(rib12_tool1.solids().sort_by_distance((0, 11.301259787, -4.681135076))[0])

    # Rib12 draft
    rib12_draft_faces = [part.faces().sort_by_distance(p)[0] for p in [
        (0, 11.275642318, -3.436418151),
        (0, 10.402997723, -5.543168569),
    ]]
    draft(rib12_draft_faces, Plane(origin=(0, 11.301259787, -4.681135076), x_dir=(1, 0, 0), z_dir=(0, 0.923879532511, -0.382683432365)), RIB12_DRAFT_ANGLE)

    # Sketch17 wall → Rib13 (add, up to next)
    with BuildSketch(Plane(origin=(0, -11.301259787, -4.681135076), x_dir=(1, 0, 0), z_dir=(0, 0.923879532511, 0.382683432365)), mode=Mode.PRIVATE) as rib13_sk1:
        Rectangle(SKETCH17_WALL_W, SKETCH17_WALL_H)
    rib13_tool1 = extrude(rib13_sk1.sketch, amount=RIB13_REACH, mode=Mode.PRIVATE) - part.part
    add(rib13_tool1.solids().sort_by_distance((0, -11.301259787, -4.681135076))[0])

    # Rib13 draft
    rib13_draft_faces = [part.faces().sort_by_distance(p)[0] for p in [
        (0, -10.402997723, -5.543168569),
        (0, -11.275642318, -3.436418151),
    ]]
    draft(rib13_draft_faces, Plane(origin=(0, -11.301259787, -4.681135076), x_dir=(1, 0, 0), z_dir=(0, -0.923879532511, -0.382683432365)), RIB13_DRAFT_ANGLE)

    # Sketch18 wall → Rib14 (add, up to next)
    with BuildSketch(Plane(origin=(0, -4.681135076, 11.301259787), x_dir=(1, 0, 0), z_dir=(0, 0.382683432365, -0.923879532511)), mode=Mode.PRIVATE) as rib14_sk1:
        Rectangle(SKETCH18_WALL_W, SKETCH18_WALL_H)
    rib14_tool1 = extrude(rib14_sk1.sketch, amount=RIB14_REACH, mode=Mode.PRIVATE) - part.part
    add(rib14_tool1.solids().sort_by_distance((0, -4.681135076, 11.301259787))[0])

    # Rib14 draft
    rib14_draft_faces = [part.faces().sort_by_distance(p)[0] for p in [
        (0, -5.543168569, 10.402997723),
        (0, -3.436418151, 11.275642318),
    ]]
    draft(rib14_draft_faces, Plane(origin=(0, -4.681135076, 11.301259787), x_dir=(1, 0, 0), z_dir=(0, -0.382683432365, 0.923879532511)), RIB14_DRAFT_ANGLE)

    # Sketch19 wall → Rib15 (add, up to next)
    with BuildSketch(Plane(origin=(0, -4.681135076, -11.301259787), x_dir=(1, 0, 0), z_dir=(0, 0.382683432365, 0.923879532511)), mode=Mode.PRIVATE) as rib15_sk1:
        Rectangle(SKETCH19_WALL_W, SKETCH19_WALL_H)
    rib15_tool1 = extrude(rib15_sk1.sketch, amount=RIB15_REACH, mode=Mode.PRIVATE) - part.part
    add(rib15_tool1.solids().sort_by_distance((0, -4.681135076, -11.301259787))[0])

    # Rib15 draft
    rib15_draft_faces = [part.faces().sort_by_distance(p)[0] for p in [
        (0, -3.436418151, -11.275642318),
        (0, -5.543168569, -10.402997723),
    ]]
    draft(rib15_draft_faces, Plane(origin=(0, -4.681135076, -11.301259787), x_dir=(1, 0, 0), z_dir=(0, -0.382683432365, -0.923879532511)), RIB15_DRAFT_ANGLE)

    # Sketch20 wall → Rib16 (add, up to next)
    with BuildSketch(Plane(origin=(0, -11.301259787, 4.681135076), x_dir=(1, 0, 0), z_dir=(0, 0.923879532511, -0.382683432365)), mode=Mode.PRIVATE) as rib16_sk1:
        Rectangle(SKETCH20_WALL_W, SKETCH20_WALL_H)
    rib16_tool1 = extrude(rib16_sk1.sketch, amount=RIB16_REACH, mode=Mode.PRIVATE) - part.part
    add(rib16_tool1.solids().sort_by_distance((0, -11.301259787, 4.681135076))[0])

    # Rib16 draft
    rib16_draft_faces = [part.faces().sort_by_distance(p)[0] for p in [
        (0, -11.275642318, 3.436418151),
        (0, -10.402997723, 5.543168569),
    ]]
    draft(rib16_draft_faces, Plane(origin=(0, -11.301259787, 4.681135076), x_dir=(1, 0, 0), z_dir=(0, -0.923879532511, 0.382683432365)), RIB16_DRAFT_ANGLE)


solid = part.part
